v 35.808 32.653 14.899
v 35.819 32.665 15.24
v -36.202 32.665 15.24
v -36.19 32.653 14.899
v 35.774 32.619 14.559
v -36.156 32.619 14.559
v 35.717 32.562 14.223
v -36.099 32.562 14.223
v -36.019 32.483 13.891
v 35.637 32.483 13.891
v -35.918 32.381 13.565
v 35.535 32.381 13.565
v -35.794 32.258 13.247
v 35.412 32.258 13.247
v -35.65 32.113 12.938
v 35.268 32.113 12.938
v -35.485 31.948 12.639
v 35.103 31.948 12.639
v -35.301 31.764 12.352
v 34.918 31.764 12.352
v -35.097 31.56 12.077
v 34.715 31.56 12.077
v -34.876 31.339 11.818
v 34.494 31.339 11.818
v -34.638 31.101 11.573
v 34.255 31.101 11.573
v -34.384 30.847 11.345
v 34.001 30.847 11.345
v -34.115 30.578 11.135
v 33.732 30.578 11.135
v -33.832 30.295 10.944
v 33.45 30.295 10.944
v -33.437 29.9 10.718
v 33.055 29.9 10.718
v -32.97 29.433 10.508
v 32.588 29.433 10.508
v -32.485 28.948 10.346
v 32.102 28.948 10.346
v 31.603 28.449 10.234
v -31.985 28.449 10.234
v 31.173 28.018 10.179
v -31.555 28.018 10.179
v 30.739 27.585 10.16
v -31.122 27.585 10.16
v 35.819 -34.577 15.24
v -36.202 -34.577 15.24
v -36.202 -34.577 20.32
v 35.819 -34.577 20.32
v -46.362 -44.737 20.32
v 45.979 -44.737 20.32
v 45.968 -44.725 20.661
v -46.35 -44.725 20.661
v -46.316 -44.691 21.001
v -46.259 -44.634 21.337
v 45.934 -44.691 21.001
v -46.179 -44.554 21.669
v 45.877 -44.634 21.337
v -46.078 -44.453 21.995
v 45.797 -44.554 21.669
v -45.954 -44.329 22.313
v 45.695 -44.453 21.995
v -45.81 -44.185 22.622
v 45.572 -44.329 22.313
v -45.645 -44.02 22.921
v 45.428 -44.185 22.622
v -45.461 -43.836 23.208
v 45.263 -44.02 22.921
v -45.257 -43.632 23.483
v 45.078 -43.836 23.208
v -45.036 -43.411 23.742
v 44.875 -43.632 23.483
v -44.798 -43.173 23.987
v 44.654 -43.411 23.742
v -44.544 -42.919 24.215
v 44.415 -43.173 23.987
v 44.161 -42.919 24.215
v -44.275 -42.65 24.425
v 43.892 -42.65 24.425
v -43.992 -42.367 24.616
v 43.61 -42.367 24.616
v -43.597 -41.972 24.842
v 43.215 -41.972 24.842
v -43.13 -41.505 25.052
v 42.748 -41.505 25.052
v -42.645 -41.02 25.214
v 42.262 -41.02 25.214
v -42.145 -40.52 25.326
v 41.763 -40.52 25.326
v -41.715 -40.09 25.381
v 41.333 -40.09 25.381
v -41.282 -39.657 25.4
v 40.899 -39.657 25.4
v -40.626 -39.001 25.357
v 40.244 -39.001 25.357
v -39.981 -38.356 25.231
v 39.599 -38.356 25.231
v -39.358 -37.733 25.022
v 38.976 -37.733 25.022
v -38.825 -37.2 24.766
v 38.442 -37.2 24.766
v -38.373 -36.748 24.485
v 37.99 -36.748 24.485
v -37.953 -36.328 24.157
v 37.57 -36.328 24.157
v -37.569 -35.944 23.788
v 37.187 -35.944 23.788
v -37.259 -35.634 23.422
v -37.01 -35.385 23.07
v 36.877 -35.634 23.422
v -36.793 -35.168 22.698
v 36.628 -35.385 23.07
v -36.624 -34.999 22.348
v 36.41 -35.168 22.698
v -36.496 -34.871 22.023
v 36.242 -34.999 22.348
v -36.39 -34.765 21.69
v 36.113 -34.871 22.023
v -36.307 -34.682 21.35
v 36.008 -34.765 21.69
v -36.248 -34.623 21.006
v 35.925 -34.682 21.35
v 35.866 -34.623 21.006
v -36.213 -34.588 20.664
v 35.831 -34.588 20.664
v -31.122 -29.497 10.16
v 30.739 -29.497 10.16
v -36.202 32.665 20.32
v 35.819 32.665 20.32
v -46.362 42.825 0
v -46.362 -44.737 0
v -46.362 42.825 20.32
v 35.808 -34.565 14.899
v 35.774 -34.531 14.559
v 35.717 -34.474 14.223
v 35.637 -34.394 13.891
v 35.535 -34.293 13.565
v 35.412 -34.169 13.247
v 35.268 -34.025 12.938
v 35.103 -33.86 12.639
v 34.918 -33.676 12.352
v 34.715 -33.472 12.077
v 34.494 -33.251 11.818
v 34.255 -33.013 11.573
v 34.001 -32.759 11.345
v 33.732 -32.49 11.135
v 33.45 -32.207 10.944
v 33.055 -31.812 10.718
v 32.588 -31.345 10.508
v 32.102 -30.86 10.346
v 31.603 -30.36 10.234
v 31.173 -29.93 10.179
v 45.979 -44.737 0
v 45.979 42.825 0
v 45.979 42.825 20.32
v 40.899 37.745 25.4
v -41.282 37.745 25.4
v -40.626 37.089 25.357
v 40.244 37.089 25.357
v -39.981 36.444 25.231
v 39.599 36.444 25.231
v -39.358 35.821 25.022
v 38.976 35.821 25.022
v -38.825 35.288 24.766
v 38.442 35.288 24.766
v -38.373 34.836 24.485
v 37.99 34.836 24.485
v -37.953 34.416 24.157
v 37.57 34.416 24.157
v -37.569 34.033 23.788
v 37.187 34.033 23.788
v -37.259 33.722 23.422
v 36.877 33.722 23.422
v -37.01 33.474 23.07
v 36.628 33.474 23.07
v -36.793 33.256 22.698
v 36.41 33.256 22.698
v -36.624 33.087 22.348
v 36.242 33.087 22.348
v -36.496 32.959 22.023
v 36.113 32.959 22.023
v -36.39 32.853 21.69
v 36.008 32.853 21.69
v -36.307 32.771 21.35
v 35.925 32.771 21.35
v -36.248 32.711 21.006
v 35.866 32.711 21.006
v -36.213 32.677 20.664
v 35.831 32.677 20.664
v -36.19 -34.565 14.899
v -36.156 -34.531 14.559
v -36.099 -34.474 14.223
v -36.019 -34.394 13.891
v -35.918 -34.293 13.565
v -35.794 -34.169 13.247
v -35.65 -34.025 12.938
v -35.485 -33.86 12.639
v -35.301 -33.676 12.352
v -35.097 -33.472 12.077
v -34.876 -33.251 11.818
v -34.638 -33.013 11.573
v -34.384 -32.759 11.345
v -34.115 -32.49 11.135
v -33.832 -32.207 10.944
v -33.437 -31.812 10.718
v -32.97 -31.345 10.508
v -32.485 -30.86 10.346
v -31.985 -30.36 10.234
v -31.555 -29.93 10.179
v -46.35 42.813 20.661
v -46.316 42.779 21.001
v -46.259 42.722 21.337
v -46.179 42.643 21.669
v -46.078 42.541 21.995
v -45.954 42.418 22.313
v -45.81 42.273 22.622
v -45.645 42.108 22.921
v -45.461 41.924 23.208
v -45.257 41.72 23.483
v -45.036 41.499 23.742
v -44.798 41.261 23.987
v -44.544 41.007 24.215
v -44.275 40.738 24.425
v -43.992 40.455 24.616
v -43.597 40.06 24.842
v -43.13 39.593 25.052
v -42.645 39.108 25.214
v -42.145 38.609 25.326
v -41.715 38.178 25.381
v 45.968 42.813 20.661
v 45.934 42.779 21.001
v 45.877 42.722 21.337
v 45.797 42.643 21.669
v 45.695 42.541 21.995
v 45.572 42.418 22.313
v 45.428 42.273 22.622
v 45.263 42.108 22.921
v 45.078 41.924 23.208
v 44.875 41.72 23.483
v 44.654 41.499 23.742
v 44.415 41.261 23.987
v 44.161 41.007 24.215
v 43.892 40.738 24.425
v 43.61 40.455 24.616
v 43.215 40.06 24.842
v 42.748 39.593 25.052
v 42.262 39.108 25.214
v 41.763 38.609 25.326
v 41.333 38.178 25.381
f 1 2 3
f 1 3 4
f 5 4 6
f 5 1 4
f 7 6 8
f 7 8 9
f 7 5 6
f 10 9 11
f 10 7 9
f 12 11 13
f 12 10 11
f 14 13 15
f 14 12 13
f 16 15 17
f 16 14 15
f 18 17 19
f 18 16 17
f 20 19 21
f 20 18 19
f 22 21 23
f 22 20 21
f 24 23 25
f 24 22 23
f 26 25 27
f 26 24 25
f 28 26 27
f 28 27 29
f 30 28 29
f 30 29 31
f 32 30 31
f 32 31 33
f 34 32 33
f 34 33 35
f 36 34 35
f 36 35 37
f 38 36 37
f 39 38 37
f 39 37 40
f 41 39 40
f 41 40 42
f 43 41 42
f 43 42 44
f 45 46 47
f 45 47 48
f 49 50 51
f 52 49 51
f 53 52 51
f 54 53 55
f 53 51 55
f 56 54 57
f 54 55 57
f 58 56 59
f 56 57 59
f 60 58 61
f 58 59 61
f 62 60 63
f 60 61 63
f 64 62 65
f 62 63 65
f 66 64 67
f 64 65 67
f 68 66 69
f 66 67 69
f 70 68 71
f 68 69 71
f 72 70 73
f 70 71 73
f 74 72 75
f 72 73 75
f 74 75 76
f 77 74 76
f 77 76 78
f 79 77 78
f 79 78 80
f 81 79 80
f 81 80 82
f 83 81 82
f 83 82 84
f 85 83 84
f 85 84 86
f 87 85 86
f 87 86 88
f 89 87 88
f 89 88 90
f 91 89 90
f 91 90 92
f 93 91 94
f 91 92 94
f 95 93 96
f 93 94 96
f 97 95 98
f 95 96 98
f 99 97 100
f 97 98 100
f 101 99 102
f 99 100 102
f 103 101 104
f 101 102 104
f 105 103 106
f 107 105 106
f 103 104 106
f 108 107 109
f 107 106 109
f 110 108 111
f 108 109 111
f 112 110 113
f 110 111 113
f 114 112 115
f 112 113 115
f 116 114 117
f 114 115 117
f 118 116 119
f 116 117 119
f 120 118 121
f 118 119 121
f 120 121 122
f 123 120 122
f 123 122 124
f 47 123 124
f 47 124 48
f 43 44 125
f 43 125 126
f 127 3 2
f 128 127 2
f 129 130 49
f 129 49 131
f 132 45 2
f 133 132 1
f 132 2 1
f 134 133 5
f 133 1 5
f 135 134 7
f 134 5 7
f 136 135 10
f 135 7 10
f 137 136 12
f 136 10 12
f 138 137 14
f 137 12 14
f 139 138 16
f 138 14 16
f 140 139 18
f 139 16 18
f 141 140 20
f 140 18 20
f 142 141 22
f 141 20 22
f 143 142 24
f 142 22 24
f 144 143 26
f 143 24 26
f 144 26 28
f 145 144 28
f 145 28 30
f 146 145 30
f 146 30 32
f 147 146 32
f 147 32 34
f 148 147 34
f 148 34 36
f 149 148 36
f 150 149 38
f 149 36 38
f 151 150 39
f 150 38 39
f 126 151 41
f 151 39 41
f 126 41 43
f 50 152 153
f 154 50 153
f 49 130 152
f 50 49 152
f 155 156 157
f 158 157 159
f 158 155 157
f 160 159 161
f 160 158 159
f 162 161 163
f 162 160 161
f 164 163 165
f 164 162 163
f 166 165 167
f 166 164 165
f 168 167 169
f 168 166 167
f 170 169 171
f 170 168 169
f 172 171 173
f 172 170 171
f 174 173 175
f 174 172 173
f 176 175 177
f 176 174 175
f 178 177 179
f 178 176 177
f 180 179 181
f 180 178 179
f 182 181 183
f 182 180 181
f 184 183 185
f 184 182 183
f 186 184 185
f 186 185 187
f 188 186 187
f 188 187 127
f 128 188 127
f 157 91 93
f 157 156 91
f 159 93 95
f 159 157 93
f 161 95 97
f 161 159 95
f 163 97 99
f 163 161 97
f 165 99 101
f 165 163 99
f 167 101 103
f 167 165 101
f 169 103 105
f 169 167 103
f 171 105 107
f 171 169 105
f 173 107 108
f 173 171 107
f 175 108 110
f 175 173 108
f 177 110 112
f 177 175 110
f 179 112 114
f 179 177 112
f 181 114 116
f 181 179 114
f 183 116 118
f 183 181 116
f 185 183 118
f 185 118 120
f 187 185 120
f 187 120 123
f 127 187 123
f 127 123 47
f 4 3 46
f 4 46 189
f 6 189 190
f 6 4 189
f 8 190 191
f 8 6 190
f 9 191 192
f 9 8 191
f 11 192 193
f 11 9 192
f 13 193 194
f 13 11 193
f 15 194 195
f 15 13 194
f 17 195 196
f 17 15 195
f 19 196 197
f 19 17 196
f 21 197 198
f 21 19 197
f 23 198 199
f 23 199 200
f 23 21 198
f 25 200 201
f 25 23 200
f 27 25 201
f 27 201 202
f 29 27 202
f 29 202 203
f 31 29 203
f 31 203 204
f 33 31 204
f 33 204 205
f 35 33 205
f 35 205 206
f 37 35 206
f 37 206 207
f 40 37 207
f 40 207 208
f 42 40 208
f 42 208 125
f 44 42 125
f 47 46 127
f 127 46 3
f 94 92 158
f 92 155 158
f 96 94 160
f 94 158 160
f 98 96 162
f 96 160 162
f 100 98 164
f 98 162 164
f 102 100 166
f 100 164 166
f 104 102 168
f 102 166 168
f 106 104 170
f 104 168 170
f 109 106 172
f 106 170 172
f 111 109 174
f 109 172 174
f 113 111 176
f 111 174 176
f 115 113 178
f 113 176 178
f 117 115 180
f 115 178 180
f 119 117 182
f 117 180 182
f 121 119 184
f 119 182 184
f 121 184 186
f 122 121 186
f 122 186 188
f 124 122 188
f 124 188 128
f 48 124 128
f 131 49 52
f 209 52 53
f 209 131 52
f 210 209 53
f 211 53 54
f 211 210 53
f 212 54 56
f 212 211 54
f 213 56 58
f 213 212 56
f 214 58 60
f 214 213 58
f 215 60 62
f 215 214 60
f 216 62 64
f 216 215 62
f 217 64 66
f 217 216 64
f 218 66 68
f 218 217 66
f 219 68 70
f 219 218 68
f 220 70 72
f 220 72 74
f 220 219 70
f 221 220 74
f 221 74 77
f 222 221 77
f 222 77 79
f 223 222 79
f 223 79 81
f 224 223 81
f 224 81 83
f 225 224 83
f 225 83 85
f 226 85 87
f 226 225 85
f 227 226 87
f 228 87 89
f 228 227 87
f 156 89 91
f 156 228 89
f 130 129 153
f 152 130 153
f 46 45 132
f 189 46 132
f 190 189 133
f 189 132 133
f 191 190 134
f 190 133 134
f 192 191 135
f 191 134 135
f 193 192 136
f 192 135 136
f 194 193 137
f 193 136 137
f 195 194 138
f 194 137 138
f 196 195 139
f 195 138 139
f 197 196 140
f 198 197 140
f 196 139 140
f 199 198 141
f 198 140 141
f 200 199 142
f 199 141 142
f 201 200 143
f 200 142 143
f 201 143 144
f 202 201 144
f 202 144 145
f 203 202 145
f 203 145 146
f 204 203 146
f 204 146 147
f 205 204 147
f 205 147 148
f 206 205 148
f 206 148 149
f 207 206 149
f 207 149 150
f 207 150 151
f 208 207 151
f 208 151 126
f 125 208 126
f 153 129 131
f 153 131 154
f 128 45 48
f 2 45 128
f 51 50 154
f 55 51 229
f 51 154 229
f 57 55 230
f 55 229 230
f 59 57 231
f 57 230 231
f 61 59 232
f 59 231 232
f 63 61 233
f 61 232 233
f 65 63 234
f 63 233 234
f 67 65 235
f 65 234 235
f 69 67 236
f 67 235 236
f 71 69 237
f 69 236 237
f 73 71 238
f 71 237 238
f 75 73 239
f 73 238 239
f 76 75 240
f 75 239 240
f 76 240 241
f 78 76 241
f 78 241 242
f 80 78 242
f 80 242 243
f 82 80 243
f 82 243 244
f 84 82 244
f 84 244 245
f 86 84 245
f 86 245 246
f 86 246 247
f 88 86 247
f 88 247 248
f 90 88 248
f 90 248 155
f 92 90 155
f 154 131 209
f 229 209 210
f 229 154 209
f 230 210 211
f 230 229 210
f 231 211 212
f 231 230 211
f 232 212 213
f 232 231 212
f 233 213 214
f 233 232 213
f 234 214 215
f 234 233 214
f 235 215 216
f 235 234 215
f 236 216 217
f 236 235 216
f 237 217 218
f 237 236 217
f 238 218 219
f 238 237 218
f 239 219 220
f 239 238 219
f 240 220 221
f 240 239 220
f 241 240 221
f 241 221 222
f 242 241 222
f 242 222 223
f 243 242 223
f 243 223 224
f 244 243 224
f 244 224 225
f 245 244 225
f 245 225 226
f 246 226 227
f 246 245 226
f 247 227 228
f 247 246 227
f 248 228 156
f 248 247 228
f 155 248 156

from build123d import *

# Parameters (mm, degrees)
F0_W     = 92.3412963748
F0_H     = 87.5617265701
F1_DEPTH = 25.4
F2_T     = -10.16
F3_R     = 5.07999


# Not quite as in the source:
# - a fillet or chamfer is up to 0.001 mm smaller than in the source, because OpenCascade refuses the exact size


with BuildPart() as f1:
    # F0 (on Top) → F1 (new body)
    with BuildSketch(Plane.XY):
        with Locations((-0.1911818981, -0.9559132159)):
            Rectangle(F0_W, F0_H)
    extrude(amount=F1_DEPTH)

    # F2
    f2_openings = [f1.faces().sort_by_distance(p)[0] for p in [
        (-0.191182, -0.955913, 25.4),
    ]]
    offset(amount=F2_T, openings=f2_openings)

    # F3 (radius 5.08 in the source; OpenCascade refuses exactly that, so slightly less here)
    f3_edges = [f1.edges().sort_by_distance(p)[0] for p in [
        (35.819466, -0.955913, 10.16),
        (-0.191182, 32.66495, 10.16),
        (-36.20183, -0.955913, 10.16),
        (-0.191182, -34.576777, 10.16),
        (45.979466, -0.955913, 25.4),
        (-0.191182, 42.82495, 25.4),
        (-46.36183, -0.955913, 25.4),
        (-0.191182, -44.736777, 25.4),
        (35.819466, -0.955913, 25.4),
        (-0.191182, -34.576777, 25.4),
        (-36.20183, -0.955913, 25.4),
        (-0.191182, 32.66495, 25.4),
    ]]
    fillet(f3_edges, radius=F3_R)


solid = f1.part
